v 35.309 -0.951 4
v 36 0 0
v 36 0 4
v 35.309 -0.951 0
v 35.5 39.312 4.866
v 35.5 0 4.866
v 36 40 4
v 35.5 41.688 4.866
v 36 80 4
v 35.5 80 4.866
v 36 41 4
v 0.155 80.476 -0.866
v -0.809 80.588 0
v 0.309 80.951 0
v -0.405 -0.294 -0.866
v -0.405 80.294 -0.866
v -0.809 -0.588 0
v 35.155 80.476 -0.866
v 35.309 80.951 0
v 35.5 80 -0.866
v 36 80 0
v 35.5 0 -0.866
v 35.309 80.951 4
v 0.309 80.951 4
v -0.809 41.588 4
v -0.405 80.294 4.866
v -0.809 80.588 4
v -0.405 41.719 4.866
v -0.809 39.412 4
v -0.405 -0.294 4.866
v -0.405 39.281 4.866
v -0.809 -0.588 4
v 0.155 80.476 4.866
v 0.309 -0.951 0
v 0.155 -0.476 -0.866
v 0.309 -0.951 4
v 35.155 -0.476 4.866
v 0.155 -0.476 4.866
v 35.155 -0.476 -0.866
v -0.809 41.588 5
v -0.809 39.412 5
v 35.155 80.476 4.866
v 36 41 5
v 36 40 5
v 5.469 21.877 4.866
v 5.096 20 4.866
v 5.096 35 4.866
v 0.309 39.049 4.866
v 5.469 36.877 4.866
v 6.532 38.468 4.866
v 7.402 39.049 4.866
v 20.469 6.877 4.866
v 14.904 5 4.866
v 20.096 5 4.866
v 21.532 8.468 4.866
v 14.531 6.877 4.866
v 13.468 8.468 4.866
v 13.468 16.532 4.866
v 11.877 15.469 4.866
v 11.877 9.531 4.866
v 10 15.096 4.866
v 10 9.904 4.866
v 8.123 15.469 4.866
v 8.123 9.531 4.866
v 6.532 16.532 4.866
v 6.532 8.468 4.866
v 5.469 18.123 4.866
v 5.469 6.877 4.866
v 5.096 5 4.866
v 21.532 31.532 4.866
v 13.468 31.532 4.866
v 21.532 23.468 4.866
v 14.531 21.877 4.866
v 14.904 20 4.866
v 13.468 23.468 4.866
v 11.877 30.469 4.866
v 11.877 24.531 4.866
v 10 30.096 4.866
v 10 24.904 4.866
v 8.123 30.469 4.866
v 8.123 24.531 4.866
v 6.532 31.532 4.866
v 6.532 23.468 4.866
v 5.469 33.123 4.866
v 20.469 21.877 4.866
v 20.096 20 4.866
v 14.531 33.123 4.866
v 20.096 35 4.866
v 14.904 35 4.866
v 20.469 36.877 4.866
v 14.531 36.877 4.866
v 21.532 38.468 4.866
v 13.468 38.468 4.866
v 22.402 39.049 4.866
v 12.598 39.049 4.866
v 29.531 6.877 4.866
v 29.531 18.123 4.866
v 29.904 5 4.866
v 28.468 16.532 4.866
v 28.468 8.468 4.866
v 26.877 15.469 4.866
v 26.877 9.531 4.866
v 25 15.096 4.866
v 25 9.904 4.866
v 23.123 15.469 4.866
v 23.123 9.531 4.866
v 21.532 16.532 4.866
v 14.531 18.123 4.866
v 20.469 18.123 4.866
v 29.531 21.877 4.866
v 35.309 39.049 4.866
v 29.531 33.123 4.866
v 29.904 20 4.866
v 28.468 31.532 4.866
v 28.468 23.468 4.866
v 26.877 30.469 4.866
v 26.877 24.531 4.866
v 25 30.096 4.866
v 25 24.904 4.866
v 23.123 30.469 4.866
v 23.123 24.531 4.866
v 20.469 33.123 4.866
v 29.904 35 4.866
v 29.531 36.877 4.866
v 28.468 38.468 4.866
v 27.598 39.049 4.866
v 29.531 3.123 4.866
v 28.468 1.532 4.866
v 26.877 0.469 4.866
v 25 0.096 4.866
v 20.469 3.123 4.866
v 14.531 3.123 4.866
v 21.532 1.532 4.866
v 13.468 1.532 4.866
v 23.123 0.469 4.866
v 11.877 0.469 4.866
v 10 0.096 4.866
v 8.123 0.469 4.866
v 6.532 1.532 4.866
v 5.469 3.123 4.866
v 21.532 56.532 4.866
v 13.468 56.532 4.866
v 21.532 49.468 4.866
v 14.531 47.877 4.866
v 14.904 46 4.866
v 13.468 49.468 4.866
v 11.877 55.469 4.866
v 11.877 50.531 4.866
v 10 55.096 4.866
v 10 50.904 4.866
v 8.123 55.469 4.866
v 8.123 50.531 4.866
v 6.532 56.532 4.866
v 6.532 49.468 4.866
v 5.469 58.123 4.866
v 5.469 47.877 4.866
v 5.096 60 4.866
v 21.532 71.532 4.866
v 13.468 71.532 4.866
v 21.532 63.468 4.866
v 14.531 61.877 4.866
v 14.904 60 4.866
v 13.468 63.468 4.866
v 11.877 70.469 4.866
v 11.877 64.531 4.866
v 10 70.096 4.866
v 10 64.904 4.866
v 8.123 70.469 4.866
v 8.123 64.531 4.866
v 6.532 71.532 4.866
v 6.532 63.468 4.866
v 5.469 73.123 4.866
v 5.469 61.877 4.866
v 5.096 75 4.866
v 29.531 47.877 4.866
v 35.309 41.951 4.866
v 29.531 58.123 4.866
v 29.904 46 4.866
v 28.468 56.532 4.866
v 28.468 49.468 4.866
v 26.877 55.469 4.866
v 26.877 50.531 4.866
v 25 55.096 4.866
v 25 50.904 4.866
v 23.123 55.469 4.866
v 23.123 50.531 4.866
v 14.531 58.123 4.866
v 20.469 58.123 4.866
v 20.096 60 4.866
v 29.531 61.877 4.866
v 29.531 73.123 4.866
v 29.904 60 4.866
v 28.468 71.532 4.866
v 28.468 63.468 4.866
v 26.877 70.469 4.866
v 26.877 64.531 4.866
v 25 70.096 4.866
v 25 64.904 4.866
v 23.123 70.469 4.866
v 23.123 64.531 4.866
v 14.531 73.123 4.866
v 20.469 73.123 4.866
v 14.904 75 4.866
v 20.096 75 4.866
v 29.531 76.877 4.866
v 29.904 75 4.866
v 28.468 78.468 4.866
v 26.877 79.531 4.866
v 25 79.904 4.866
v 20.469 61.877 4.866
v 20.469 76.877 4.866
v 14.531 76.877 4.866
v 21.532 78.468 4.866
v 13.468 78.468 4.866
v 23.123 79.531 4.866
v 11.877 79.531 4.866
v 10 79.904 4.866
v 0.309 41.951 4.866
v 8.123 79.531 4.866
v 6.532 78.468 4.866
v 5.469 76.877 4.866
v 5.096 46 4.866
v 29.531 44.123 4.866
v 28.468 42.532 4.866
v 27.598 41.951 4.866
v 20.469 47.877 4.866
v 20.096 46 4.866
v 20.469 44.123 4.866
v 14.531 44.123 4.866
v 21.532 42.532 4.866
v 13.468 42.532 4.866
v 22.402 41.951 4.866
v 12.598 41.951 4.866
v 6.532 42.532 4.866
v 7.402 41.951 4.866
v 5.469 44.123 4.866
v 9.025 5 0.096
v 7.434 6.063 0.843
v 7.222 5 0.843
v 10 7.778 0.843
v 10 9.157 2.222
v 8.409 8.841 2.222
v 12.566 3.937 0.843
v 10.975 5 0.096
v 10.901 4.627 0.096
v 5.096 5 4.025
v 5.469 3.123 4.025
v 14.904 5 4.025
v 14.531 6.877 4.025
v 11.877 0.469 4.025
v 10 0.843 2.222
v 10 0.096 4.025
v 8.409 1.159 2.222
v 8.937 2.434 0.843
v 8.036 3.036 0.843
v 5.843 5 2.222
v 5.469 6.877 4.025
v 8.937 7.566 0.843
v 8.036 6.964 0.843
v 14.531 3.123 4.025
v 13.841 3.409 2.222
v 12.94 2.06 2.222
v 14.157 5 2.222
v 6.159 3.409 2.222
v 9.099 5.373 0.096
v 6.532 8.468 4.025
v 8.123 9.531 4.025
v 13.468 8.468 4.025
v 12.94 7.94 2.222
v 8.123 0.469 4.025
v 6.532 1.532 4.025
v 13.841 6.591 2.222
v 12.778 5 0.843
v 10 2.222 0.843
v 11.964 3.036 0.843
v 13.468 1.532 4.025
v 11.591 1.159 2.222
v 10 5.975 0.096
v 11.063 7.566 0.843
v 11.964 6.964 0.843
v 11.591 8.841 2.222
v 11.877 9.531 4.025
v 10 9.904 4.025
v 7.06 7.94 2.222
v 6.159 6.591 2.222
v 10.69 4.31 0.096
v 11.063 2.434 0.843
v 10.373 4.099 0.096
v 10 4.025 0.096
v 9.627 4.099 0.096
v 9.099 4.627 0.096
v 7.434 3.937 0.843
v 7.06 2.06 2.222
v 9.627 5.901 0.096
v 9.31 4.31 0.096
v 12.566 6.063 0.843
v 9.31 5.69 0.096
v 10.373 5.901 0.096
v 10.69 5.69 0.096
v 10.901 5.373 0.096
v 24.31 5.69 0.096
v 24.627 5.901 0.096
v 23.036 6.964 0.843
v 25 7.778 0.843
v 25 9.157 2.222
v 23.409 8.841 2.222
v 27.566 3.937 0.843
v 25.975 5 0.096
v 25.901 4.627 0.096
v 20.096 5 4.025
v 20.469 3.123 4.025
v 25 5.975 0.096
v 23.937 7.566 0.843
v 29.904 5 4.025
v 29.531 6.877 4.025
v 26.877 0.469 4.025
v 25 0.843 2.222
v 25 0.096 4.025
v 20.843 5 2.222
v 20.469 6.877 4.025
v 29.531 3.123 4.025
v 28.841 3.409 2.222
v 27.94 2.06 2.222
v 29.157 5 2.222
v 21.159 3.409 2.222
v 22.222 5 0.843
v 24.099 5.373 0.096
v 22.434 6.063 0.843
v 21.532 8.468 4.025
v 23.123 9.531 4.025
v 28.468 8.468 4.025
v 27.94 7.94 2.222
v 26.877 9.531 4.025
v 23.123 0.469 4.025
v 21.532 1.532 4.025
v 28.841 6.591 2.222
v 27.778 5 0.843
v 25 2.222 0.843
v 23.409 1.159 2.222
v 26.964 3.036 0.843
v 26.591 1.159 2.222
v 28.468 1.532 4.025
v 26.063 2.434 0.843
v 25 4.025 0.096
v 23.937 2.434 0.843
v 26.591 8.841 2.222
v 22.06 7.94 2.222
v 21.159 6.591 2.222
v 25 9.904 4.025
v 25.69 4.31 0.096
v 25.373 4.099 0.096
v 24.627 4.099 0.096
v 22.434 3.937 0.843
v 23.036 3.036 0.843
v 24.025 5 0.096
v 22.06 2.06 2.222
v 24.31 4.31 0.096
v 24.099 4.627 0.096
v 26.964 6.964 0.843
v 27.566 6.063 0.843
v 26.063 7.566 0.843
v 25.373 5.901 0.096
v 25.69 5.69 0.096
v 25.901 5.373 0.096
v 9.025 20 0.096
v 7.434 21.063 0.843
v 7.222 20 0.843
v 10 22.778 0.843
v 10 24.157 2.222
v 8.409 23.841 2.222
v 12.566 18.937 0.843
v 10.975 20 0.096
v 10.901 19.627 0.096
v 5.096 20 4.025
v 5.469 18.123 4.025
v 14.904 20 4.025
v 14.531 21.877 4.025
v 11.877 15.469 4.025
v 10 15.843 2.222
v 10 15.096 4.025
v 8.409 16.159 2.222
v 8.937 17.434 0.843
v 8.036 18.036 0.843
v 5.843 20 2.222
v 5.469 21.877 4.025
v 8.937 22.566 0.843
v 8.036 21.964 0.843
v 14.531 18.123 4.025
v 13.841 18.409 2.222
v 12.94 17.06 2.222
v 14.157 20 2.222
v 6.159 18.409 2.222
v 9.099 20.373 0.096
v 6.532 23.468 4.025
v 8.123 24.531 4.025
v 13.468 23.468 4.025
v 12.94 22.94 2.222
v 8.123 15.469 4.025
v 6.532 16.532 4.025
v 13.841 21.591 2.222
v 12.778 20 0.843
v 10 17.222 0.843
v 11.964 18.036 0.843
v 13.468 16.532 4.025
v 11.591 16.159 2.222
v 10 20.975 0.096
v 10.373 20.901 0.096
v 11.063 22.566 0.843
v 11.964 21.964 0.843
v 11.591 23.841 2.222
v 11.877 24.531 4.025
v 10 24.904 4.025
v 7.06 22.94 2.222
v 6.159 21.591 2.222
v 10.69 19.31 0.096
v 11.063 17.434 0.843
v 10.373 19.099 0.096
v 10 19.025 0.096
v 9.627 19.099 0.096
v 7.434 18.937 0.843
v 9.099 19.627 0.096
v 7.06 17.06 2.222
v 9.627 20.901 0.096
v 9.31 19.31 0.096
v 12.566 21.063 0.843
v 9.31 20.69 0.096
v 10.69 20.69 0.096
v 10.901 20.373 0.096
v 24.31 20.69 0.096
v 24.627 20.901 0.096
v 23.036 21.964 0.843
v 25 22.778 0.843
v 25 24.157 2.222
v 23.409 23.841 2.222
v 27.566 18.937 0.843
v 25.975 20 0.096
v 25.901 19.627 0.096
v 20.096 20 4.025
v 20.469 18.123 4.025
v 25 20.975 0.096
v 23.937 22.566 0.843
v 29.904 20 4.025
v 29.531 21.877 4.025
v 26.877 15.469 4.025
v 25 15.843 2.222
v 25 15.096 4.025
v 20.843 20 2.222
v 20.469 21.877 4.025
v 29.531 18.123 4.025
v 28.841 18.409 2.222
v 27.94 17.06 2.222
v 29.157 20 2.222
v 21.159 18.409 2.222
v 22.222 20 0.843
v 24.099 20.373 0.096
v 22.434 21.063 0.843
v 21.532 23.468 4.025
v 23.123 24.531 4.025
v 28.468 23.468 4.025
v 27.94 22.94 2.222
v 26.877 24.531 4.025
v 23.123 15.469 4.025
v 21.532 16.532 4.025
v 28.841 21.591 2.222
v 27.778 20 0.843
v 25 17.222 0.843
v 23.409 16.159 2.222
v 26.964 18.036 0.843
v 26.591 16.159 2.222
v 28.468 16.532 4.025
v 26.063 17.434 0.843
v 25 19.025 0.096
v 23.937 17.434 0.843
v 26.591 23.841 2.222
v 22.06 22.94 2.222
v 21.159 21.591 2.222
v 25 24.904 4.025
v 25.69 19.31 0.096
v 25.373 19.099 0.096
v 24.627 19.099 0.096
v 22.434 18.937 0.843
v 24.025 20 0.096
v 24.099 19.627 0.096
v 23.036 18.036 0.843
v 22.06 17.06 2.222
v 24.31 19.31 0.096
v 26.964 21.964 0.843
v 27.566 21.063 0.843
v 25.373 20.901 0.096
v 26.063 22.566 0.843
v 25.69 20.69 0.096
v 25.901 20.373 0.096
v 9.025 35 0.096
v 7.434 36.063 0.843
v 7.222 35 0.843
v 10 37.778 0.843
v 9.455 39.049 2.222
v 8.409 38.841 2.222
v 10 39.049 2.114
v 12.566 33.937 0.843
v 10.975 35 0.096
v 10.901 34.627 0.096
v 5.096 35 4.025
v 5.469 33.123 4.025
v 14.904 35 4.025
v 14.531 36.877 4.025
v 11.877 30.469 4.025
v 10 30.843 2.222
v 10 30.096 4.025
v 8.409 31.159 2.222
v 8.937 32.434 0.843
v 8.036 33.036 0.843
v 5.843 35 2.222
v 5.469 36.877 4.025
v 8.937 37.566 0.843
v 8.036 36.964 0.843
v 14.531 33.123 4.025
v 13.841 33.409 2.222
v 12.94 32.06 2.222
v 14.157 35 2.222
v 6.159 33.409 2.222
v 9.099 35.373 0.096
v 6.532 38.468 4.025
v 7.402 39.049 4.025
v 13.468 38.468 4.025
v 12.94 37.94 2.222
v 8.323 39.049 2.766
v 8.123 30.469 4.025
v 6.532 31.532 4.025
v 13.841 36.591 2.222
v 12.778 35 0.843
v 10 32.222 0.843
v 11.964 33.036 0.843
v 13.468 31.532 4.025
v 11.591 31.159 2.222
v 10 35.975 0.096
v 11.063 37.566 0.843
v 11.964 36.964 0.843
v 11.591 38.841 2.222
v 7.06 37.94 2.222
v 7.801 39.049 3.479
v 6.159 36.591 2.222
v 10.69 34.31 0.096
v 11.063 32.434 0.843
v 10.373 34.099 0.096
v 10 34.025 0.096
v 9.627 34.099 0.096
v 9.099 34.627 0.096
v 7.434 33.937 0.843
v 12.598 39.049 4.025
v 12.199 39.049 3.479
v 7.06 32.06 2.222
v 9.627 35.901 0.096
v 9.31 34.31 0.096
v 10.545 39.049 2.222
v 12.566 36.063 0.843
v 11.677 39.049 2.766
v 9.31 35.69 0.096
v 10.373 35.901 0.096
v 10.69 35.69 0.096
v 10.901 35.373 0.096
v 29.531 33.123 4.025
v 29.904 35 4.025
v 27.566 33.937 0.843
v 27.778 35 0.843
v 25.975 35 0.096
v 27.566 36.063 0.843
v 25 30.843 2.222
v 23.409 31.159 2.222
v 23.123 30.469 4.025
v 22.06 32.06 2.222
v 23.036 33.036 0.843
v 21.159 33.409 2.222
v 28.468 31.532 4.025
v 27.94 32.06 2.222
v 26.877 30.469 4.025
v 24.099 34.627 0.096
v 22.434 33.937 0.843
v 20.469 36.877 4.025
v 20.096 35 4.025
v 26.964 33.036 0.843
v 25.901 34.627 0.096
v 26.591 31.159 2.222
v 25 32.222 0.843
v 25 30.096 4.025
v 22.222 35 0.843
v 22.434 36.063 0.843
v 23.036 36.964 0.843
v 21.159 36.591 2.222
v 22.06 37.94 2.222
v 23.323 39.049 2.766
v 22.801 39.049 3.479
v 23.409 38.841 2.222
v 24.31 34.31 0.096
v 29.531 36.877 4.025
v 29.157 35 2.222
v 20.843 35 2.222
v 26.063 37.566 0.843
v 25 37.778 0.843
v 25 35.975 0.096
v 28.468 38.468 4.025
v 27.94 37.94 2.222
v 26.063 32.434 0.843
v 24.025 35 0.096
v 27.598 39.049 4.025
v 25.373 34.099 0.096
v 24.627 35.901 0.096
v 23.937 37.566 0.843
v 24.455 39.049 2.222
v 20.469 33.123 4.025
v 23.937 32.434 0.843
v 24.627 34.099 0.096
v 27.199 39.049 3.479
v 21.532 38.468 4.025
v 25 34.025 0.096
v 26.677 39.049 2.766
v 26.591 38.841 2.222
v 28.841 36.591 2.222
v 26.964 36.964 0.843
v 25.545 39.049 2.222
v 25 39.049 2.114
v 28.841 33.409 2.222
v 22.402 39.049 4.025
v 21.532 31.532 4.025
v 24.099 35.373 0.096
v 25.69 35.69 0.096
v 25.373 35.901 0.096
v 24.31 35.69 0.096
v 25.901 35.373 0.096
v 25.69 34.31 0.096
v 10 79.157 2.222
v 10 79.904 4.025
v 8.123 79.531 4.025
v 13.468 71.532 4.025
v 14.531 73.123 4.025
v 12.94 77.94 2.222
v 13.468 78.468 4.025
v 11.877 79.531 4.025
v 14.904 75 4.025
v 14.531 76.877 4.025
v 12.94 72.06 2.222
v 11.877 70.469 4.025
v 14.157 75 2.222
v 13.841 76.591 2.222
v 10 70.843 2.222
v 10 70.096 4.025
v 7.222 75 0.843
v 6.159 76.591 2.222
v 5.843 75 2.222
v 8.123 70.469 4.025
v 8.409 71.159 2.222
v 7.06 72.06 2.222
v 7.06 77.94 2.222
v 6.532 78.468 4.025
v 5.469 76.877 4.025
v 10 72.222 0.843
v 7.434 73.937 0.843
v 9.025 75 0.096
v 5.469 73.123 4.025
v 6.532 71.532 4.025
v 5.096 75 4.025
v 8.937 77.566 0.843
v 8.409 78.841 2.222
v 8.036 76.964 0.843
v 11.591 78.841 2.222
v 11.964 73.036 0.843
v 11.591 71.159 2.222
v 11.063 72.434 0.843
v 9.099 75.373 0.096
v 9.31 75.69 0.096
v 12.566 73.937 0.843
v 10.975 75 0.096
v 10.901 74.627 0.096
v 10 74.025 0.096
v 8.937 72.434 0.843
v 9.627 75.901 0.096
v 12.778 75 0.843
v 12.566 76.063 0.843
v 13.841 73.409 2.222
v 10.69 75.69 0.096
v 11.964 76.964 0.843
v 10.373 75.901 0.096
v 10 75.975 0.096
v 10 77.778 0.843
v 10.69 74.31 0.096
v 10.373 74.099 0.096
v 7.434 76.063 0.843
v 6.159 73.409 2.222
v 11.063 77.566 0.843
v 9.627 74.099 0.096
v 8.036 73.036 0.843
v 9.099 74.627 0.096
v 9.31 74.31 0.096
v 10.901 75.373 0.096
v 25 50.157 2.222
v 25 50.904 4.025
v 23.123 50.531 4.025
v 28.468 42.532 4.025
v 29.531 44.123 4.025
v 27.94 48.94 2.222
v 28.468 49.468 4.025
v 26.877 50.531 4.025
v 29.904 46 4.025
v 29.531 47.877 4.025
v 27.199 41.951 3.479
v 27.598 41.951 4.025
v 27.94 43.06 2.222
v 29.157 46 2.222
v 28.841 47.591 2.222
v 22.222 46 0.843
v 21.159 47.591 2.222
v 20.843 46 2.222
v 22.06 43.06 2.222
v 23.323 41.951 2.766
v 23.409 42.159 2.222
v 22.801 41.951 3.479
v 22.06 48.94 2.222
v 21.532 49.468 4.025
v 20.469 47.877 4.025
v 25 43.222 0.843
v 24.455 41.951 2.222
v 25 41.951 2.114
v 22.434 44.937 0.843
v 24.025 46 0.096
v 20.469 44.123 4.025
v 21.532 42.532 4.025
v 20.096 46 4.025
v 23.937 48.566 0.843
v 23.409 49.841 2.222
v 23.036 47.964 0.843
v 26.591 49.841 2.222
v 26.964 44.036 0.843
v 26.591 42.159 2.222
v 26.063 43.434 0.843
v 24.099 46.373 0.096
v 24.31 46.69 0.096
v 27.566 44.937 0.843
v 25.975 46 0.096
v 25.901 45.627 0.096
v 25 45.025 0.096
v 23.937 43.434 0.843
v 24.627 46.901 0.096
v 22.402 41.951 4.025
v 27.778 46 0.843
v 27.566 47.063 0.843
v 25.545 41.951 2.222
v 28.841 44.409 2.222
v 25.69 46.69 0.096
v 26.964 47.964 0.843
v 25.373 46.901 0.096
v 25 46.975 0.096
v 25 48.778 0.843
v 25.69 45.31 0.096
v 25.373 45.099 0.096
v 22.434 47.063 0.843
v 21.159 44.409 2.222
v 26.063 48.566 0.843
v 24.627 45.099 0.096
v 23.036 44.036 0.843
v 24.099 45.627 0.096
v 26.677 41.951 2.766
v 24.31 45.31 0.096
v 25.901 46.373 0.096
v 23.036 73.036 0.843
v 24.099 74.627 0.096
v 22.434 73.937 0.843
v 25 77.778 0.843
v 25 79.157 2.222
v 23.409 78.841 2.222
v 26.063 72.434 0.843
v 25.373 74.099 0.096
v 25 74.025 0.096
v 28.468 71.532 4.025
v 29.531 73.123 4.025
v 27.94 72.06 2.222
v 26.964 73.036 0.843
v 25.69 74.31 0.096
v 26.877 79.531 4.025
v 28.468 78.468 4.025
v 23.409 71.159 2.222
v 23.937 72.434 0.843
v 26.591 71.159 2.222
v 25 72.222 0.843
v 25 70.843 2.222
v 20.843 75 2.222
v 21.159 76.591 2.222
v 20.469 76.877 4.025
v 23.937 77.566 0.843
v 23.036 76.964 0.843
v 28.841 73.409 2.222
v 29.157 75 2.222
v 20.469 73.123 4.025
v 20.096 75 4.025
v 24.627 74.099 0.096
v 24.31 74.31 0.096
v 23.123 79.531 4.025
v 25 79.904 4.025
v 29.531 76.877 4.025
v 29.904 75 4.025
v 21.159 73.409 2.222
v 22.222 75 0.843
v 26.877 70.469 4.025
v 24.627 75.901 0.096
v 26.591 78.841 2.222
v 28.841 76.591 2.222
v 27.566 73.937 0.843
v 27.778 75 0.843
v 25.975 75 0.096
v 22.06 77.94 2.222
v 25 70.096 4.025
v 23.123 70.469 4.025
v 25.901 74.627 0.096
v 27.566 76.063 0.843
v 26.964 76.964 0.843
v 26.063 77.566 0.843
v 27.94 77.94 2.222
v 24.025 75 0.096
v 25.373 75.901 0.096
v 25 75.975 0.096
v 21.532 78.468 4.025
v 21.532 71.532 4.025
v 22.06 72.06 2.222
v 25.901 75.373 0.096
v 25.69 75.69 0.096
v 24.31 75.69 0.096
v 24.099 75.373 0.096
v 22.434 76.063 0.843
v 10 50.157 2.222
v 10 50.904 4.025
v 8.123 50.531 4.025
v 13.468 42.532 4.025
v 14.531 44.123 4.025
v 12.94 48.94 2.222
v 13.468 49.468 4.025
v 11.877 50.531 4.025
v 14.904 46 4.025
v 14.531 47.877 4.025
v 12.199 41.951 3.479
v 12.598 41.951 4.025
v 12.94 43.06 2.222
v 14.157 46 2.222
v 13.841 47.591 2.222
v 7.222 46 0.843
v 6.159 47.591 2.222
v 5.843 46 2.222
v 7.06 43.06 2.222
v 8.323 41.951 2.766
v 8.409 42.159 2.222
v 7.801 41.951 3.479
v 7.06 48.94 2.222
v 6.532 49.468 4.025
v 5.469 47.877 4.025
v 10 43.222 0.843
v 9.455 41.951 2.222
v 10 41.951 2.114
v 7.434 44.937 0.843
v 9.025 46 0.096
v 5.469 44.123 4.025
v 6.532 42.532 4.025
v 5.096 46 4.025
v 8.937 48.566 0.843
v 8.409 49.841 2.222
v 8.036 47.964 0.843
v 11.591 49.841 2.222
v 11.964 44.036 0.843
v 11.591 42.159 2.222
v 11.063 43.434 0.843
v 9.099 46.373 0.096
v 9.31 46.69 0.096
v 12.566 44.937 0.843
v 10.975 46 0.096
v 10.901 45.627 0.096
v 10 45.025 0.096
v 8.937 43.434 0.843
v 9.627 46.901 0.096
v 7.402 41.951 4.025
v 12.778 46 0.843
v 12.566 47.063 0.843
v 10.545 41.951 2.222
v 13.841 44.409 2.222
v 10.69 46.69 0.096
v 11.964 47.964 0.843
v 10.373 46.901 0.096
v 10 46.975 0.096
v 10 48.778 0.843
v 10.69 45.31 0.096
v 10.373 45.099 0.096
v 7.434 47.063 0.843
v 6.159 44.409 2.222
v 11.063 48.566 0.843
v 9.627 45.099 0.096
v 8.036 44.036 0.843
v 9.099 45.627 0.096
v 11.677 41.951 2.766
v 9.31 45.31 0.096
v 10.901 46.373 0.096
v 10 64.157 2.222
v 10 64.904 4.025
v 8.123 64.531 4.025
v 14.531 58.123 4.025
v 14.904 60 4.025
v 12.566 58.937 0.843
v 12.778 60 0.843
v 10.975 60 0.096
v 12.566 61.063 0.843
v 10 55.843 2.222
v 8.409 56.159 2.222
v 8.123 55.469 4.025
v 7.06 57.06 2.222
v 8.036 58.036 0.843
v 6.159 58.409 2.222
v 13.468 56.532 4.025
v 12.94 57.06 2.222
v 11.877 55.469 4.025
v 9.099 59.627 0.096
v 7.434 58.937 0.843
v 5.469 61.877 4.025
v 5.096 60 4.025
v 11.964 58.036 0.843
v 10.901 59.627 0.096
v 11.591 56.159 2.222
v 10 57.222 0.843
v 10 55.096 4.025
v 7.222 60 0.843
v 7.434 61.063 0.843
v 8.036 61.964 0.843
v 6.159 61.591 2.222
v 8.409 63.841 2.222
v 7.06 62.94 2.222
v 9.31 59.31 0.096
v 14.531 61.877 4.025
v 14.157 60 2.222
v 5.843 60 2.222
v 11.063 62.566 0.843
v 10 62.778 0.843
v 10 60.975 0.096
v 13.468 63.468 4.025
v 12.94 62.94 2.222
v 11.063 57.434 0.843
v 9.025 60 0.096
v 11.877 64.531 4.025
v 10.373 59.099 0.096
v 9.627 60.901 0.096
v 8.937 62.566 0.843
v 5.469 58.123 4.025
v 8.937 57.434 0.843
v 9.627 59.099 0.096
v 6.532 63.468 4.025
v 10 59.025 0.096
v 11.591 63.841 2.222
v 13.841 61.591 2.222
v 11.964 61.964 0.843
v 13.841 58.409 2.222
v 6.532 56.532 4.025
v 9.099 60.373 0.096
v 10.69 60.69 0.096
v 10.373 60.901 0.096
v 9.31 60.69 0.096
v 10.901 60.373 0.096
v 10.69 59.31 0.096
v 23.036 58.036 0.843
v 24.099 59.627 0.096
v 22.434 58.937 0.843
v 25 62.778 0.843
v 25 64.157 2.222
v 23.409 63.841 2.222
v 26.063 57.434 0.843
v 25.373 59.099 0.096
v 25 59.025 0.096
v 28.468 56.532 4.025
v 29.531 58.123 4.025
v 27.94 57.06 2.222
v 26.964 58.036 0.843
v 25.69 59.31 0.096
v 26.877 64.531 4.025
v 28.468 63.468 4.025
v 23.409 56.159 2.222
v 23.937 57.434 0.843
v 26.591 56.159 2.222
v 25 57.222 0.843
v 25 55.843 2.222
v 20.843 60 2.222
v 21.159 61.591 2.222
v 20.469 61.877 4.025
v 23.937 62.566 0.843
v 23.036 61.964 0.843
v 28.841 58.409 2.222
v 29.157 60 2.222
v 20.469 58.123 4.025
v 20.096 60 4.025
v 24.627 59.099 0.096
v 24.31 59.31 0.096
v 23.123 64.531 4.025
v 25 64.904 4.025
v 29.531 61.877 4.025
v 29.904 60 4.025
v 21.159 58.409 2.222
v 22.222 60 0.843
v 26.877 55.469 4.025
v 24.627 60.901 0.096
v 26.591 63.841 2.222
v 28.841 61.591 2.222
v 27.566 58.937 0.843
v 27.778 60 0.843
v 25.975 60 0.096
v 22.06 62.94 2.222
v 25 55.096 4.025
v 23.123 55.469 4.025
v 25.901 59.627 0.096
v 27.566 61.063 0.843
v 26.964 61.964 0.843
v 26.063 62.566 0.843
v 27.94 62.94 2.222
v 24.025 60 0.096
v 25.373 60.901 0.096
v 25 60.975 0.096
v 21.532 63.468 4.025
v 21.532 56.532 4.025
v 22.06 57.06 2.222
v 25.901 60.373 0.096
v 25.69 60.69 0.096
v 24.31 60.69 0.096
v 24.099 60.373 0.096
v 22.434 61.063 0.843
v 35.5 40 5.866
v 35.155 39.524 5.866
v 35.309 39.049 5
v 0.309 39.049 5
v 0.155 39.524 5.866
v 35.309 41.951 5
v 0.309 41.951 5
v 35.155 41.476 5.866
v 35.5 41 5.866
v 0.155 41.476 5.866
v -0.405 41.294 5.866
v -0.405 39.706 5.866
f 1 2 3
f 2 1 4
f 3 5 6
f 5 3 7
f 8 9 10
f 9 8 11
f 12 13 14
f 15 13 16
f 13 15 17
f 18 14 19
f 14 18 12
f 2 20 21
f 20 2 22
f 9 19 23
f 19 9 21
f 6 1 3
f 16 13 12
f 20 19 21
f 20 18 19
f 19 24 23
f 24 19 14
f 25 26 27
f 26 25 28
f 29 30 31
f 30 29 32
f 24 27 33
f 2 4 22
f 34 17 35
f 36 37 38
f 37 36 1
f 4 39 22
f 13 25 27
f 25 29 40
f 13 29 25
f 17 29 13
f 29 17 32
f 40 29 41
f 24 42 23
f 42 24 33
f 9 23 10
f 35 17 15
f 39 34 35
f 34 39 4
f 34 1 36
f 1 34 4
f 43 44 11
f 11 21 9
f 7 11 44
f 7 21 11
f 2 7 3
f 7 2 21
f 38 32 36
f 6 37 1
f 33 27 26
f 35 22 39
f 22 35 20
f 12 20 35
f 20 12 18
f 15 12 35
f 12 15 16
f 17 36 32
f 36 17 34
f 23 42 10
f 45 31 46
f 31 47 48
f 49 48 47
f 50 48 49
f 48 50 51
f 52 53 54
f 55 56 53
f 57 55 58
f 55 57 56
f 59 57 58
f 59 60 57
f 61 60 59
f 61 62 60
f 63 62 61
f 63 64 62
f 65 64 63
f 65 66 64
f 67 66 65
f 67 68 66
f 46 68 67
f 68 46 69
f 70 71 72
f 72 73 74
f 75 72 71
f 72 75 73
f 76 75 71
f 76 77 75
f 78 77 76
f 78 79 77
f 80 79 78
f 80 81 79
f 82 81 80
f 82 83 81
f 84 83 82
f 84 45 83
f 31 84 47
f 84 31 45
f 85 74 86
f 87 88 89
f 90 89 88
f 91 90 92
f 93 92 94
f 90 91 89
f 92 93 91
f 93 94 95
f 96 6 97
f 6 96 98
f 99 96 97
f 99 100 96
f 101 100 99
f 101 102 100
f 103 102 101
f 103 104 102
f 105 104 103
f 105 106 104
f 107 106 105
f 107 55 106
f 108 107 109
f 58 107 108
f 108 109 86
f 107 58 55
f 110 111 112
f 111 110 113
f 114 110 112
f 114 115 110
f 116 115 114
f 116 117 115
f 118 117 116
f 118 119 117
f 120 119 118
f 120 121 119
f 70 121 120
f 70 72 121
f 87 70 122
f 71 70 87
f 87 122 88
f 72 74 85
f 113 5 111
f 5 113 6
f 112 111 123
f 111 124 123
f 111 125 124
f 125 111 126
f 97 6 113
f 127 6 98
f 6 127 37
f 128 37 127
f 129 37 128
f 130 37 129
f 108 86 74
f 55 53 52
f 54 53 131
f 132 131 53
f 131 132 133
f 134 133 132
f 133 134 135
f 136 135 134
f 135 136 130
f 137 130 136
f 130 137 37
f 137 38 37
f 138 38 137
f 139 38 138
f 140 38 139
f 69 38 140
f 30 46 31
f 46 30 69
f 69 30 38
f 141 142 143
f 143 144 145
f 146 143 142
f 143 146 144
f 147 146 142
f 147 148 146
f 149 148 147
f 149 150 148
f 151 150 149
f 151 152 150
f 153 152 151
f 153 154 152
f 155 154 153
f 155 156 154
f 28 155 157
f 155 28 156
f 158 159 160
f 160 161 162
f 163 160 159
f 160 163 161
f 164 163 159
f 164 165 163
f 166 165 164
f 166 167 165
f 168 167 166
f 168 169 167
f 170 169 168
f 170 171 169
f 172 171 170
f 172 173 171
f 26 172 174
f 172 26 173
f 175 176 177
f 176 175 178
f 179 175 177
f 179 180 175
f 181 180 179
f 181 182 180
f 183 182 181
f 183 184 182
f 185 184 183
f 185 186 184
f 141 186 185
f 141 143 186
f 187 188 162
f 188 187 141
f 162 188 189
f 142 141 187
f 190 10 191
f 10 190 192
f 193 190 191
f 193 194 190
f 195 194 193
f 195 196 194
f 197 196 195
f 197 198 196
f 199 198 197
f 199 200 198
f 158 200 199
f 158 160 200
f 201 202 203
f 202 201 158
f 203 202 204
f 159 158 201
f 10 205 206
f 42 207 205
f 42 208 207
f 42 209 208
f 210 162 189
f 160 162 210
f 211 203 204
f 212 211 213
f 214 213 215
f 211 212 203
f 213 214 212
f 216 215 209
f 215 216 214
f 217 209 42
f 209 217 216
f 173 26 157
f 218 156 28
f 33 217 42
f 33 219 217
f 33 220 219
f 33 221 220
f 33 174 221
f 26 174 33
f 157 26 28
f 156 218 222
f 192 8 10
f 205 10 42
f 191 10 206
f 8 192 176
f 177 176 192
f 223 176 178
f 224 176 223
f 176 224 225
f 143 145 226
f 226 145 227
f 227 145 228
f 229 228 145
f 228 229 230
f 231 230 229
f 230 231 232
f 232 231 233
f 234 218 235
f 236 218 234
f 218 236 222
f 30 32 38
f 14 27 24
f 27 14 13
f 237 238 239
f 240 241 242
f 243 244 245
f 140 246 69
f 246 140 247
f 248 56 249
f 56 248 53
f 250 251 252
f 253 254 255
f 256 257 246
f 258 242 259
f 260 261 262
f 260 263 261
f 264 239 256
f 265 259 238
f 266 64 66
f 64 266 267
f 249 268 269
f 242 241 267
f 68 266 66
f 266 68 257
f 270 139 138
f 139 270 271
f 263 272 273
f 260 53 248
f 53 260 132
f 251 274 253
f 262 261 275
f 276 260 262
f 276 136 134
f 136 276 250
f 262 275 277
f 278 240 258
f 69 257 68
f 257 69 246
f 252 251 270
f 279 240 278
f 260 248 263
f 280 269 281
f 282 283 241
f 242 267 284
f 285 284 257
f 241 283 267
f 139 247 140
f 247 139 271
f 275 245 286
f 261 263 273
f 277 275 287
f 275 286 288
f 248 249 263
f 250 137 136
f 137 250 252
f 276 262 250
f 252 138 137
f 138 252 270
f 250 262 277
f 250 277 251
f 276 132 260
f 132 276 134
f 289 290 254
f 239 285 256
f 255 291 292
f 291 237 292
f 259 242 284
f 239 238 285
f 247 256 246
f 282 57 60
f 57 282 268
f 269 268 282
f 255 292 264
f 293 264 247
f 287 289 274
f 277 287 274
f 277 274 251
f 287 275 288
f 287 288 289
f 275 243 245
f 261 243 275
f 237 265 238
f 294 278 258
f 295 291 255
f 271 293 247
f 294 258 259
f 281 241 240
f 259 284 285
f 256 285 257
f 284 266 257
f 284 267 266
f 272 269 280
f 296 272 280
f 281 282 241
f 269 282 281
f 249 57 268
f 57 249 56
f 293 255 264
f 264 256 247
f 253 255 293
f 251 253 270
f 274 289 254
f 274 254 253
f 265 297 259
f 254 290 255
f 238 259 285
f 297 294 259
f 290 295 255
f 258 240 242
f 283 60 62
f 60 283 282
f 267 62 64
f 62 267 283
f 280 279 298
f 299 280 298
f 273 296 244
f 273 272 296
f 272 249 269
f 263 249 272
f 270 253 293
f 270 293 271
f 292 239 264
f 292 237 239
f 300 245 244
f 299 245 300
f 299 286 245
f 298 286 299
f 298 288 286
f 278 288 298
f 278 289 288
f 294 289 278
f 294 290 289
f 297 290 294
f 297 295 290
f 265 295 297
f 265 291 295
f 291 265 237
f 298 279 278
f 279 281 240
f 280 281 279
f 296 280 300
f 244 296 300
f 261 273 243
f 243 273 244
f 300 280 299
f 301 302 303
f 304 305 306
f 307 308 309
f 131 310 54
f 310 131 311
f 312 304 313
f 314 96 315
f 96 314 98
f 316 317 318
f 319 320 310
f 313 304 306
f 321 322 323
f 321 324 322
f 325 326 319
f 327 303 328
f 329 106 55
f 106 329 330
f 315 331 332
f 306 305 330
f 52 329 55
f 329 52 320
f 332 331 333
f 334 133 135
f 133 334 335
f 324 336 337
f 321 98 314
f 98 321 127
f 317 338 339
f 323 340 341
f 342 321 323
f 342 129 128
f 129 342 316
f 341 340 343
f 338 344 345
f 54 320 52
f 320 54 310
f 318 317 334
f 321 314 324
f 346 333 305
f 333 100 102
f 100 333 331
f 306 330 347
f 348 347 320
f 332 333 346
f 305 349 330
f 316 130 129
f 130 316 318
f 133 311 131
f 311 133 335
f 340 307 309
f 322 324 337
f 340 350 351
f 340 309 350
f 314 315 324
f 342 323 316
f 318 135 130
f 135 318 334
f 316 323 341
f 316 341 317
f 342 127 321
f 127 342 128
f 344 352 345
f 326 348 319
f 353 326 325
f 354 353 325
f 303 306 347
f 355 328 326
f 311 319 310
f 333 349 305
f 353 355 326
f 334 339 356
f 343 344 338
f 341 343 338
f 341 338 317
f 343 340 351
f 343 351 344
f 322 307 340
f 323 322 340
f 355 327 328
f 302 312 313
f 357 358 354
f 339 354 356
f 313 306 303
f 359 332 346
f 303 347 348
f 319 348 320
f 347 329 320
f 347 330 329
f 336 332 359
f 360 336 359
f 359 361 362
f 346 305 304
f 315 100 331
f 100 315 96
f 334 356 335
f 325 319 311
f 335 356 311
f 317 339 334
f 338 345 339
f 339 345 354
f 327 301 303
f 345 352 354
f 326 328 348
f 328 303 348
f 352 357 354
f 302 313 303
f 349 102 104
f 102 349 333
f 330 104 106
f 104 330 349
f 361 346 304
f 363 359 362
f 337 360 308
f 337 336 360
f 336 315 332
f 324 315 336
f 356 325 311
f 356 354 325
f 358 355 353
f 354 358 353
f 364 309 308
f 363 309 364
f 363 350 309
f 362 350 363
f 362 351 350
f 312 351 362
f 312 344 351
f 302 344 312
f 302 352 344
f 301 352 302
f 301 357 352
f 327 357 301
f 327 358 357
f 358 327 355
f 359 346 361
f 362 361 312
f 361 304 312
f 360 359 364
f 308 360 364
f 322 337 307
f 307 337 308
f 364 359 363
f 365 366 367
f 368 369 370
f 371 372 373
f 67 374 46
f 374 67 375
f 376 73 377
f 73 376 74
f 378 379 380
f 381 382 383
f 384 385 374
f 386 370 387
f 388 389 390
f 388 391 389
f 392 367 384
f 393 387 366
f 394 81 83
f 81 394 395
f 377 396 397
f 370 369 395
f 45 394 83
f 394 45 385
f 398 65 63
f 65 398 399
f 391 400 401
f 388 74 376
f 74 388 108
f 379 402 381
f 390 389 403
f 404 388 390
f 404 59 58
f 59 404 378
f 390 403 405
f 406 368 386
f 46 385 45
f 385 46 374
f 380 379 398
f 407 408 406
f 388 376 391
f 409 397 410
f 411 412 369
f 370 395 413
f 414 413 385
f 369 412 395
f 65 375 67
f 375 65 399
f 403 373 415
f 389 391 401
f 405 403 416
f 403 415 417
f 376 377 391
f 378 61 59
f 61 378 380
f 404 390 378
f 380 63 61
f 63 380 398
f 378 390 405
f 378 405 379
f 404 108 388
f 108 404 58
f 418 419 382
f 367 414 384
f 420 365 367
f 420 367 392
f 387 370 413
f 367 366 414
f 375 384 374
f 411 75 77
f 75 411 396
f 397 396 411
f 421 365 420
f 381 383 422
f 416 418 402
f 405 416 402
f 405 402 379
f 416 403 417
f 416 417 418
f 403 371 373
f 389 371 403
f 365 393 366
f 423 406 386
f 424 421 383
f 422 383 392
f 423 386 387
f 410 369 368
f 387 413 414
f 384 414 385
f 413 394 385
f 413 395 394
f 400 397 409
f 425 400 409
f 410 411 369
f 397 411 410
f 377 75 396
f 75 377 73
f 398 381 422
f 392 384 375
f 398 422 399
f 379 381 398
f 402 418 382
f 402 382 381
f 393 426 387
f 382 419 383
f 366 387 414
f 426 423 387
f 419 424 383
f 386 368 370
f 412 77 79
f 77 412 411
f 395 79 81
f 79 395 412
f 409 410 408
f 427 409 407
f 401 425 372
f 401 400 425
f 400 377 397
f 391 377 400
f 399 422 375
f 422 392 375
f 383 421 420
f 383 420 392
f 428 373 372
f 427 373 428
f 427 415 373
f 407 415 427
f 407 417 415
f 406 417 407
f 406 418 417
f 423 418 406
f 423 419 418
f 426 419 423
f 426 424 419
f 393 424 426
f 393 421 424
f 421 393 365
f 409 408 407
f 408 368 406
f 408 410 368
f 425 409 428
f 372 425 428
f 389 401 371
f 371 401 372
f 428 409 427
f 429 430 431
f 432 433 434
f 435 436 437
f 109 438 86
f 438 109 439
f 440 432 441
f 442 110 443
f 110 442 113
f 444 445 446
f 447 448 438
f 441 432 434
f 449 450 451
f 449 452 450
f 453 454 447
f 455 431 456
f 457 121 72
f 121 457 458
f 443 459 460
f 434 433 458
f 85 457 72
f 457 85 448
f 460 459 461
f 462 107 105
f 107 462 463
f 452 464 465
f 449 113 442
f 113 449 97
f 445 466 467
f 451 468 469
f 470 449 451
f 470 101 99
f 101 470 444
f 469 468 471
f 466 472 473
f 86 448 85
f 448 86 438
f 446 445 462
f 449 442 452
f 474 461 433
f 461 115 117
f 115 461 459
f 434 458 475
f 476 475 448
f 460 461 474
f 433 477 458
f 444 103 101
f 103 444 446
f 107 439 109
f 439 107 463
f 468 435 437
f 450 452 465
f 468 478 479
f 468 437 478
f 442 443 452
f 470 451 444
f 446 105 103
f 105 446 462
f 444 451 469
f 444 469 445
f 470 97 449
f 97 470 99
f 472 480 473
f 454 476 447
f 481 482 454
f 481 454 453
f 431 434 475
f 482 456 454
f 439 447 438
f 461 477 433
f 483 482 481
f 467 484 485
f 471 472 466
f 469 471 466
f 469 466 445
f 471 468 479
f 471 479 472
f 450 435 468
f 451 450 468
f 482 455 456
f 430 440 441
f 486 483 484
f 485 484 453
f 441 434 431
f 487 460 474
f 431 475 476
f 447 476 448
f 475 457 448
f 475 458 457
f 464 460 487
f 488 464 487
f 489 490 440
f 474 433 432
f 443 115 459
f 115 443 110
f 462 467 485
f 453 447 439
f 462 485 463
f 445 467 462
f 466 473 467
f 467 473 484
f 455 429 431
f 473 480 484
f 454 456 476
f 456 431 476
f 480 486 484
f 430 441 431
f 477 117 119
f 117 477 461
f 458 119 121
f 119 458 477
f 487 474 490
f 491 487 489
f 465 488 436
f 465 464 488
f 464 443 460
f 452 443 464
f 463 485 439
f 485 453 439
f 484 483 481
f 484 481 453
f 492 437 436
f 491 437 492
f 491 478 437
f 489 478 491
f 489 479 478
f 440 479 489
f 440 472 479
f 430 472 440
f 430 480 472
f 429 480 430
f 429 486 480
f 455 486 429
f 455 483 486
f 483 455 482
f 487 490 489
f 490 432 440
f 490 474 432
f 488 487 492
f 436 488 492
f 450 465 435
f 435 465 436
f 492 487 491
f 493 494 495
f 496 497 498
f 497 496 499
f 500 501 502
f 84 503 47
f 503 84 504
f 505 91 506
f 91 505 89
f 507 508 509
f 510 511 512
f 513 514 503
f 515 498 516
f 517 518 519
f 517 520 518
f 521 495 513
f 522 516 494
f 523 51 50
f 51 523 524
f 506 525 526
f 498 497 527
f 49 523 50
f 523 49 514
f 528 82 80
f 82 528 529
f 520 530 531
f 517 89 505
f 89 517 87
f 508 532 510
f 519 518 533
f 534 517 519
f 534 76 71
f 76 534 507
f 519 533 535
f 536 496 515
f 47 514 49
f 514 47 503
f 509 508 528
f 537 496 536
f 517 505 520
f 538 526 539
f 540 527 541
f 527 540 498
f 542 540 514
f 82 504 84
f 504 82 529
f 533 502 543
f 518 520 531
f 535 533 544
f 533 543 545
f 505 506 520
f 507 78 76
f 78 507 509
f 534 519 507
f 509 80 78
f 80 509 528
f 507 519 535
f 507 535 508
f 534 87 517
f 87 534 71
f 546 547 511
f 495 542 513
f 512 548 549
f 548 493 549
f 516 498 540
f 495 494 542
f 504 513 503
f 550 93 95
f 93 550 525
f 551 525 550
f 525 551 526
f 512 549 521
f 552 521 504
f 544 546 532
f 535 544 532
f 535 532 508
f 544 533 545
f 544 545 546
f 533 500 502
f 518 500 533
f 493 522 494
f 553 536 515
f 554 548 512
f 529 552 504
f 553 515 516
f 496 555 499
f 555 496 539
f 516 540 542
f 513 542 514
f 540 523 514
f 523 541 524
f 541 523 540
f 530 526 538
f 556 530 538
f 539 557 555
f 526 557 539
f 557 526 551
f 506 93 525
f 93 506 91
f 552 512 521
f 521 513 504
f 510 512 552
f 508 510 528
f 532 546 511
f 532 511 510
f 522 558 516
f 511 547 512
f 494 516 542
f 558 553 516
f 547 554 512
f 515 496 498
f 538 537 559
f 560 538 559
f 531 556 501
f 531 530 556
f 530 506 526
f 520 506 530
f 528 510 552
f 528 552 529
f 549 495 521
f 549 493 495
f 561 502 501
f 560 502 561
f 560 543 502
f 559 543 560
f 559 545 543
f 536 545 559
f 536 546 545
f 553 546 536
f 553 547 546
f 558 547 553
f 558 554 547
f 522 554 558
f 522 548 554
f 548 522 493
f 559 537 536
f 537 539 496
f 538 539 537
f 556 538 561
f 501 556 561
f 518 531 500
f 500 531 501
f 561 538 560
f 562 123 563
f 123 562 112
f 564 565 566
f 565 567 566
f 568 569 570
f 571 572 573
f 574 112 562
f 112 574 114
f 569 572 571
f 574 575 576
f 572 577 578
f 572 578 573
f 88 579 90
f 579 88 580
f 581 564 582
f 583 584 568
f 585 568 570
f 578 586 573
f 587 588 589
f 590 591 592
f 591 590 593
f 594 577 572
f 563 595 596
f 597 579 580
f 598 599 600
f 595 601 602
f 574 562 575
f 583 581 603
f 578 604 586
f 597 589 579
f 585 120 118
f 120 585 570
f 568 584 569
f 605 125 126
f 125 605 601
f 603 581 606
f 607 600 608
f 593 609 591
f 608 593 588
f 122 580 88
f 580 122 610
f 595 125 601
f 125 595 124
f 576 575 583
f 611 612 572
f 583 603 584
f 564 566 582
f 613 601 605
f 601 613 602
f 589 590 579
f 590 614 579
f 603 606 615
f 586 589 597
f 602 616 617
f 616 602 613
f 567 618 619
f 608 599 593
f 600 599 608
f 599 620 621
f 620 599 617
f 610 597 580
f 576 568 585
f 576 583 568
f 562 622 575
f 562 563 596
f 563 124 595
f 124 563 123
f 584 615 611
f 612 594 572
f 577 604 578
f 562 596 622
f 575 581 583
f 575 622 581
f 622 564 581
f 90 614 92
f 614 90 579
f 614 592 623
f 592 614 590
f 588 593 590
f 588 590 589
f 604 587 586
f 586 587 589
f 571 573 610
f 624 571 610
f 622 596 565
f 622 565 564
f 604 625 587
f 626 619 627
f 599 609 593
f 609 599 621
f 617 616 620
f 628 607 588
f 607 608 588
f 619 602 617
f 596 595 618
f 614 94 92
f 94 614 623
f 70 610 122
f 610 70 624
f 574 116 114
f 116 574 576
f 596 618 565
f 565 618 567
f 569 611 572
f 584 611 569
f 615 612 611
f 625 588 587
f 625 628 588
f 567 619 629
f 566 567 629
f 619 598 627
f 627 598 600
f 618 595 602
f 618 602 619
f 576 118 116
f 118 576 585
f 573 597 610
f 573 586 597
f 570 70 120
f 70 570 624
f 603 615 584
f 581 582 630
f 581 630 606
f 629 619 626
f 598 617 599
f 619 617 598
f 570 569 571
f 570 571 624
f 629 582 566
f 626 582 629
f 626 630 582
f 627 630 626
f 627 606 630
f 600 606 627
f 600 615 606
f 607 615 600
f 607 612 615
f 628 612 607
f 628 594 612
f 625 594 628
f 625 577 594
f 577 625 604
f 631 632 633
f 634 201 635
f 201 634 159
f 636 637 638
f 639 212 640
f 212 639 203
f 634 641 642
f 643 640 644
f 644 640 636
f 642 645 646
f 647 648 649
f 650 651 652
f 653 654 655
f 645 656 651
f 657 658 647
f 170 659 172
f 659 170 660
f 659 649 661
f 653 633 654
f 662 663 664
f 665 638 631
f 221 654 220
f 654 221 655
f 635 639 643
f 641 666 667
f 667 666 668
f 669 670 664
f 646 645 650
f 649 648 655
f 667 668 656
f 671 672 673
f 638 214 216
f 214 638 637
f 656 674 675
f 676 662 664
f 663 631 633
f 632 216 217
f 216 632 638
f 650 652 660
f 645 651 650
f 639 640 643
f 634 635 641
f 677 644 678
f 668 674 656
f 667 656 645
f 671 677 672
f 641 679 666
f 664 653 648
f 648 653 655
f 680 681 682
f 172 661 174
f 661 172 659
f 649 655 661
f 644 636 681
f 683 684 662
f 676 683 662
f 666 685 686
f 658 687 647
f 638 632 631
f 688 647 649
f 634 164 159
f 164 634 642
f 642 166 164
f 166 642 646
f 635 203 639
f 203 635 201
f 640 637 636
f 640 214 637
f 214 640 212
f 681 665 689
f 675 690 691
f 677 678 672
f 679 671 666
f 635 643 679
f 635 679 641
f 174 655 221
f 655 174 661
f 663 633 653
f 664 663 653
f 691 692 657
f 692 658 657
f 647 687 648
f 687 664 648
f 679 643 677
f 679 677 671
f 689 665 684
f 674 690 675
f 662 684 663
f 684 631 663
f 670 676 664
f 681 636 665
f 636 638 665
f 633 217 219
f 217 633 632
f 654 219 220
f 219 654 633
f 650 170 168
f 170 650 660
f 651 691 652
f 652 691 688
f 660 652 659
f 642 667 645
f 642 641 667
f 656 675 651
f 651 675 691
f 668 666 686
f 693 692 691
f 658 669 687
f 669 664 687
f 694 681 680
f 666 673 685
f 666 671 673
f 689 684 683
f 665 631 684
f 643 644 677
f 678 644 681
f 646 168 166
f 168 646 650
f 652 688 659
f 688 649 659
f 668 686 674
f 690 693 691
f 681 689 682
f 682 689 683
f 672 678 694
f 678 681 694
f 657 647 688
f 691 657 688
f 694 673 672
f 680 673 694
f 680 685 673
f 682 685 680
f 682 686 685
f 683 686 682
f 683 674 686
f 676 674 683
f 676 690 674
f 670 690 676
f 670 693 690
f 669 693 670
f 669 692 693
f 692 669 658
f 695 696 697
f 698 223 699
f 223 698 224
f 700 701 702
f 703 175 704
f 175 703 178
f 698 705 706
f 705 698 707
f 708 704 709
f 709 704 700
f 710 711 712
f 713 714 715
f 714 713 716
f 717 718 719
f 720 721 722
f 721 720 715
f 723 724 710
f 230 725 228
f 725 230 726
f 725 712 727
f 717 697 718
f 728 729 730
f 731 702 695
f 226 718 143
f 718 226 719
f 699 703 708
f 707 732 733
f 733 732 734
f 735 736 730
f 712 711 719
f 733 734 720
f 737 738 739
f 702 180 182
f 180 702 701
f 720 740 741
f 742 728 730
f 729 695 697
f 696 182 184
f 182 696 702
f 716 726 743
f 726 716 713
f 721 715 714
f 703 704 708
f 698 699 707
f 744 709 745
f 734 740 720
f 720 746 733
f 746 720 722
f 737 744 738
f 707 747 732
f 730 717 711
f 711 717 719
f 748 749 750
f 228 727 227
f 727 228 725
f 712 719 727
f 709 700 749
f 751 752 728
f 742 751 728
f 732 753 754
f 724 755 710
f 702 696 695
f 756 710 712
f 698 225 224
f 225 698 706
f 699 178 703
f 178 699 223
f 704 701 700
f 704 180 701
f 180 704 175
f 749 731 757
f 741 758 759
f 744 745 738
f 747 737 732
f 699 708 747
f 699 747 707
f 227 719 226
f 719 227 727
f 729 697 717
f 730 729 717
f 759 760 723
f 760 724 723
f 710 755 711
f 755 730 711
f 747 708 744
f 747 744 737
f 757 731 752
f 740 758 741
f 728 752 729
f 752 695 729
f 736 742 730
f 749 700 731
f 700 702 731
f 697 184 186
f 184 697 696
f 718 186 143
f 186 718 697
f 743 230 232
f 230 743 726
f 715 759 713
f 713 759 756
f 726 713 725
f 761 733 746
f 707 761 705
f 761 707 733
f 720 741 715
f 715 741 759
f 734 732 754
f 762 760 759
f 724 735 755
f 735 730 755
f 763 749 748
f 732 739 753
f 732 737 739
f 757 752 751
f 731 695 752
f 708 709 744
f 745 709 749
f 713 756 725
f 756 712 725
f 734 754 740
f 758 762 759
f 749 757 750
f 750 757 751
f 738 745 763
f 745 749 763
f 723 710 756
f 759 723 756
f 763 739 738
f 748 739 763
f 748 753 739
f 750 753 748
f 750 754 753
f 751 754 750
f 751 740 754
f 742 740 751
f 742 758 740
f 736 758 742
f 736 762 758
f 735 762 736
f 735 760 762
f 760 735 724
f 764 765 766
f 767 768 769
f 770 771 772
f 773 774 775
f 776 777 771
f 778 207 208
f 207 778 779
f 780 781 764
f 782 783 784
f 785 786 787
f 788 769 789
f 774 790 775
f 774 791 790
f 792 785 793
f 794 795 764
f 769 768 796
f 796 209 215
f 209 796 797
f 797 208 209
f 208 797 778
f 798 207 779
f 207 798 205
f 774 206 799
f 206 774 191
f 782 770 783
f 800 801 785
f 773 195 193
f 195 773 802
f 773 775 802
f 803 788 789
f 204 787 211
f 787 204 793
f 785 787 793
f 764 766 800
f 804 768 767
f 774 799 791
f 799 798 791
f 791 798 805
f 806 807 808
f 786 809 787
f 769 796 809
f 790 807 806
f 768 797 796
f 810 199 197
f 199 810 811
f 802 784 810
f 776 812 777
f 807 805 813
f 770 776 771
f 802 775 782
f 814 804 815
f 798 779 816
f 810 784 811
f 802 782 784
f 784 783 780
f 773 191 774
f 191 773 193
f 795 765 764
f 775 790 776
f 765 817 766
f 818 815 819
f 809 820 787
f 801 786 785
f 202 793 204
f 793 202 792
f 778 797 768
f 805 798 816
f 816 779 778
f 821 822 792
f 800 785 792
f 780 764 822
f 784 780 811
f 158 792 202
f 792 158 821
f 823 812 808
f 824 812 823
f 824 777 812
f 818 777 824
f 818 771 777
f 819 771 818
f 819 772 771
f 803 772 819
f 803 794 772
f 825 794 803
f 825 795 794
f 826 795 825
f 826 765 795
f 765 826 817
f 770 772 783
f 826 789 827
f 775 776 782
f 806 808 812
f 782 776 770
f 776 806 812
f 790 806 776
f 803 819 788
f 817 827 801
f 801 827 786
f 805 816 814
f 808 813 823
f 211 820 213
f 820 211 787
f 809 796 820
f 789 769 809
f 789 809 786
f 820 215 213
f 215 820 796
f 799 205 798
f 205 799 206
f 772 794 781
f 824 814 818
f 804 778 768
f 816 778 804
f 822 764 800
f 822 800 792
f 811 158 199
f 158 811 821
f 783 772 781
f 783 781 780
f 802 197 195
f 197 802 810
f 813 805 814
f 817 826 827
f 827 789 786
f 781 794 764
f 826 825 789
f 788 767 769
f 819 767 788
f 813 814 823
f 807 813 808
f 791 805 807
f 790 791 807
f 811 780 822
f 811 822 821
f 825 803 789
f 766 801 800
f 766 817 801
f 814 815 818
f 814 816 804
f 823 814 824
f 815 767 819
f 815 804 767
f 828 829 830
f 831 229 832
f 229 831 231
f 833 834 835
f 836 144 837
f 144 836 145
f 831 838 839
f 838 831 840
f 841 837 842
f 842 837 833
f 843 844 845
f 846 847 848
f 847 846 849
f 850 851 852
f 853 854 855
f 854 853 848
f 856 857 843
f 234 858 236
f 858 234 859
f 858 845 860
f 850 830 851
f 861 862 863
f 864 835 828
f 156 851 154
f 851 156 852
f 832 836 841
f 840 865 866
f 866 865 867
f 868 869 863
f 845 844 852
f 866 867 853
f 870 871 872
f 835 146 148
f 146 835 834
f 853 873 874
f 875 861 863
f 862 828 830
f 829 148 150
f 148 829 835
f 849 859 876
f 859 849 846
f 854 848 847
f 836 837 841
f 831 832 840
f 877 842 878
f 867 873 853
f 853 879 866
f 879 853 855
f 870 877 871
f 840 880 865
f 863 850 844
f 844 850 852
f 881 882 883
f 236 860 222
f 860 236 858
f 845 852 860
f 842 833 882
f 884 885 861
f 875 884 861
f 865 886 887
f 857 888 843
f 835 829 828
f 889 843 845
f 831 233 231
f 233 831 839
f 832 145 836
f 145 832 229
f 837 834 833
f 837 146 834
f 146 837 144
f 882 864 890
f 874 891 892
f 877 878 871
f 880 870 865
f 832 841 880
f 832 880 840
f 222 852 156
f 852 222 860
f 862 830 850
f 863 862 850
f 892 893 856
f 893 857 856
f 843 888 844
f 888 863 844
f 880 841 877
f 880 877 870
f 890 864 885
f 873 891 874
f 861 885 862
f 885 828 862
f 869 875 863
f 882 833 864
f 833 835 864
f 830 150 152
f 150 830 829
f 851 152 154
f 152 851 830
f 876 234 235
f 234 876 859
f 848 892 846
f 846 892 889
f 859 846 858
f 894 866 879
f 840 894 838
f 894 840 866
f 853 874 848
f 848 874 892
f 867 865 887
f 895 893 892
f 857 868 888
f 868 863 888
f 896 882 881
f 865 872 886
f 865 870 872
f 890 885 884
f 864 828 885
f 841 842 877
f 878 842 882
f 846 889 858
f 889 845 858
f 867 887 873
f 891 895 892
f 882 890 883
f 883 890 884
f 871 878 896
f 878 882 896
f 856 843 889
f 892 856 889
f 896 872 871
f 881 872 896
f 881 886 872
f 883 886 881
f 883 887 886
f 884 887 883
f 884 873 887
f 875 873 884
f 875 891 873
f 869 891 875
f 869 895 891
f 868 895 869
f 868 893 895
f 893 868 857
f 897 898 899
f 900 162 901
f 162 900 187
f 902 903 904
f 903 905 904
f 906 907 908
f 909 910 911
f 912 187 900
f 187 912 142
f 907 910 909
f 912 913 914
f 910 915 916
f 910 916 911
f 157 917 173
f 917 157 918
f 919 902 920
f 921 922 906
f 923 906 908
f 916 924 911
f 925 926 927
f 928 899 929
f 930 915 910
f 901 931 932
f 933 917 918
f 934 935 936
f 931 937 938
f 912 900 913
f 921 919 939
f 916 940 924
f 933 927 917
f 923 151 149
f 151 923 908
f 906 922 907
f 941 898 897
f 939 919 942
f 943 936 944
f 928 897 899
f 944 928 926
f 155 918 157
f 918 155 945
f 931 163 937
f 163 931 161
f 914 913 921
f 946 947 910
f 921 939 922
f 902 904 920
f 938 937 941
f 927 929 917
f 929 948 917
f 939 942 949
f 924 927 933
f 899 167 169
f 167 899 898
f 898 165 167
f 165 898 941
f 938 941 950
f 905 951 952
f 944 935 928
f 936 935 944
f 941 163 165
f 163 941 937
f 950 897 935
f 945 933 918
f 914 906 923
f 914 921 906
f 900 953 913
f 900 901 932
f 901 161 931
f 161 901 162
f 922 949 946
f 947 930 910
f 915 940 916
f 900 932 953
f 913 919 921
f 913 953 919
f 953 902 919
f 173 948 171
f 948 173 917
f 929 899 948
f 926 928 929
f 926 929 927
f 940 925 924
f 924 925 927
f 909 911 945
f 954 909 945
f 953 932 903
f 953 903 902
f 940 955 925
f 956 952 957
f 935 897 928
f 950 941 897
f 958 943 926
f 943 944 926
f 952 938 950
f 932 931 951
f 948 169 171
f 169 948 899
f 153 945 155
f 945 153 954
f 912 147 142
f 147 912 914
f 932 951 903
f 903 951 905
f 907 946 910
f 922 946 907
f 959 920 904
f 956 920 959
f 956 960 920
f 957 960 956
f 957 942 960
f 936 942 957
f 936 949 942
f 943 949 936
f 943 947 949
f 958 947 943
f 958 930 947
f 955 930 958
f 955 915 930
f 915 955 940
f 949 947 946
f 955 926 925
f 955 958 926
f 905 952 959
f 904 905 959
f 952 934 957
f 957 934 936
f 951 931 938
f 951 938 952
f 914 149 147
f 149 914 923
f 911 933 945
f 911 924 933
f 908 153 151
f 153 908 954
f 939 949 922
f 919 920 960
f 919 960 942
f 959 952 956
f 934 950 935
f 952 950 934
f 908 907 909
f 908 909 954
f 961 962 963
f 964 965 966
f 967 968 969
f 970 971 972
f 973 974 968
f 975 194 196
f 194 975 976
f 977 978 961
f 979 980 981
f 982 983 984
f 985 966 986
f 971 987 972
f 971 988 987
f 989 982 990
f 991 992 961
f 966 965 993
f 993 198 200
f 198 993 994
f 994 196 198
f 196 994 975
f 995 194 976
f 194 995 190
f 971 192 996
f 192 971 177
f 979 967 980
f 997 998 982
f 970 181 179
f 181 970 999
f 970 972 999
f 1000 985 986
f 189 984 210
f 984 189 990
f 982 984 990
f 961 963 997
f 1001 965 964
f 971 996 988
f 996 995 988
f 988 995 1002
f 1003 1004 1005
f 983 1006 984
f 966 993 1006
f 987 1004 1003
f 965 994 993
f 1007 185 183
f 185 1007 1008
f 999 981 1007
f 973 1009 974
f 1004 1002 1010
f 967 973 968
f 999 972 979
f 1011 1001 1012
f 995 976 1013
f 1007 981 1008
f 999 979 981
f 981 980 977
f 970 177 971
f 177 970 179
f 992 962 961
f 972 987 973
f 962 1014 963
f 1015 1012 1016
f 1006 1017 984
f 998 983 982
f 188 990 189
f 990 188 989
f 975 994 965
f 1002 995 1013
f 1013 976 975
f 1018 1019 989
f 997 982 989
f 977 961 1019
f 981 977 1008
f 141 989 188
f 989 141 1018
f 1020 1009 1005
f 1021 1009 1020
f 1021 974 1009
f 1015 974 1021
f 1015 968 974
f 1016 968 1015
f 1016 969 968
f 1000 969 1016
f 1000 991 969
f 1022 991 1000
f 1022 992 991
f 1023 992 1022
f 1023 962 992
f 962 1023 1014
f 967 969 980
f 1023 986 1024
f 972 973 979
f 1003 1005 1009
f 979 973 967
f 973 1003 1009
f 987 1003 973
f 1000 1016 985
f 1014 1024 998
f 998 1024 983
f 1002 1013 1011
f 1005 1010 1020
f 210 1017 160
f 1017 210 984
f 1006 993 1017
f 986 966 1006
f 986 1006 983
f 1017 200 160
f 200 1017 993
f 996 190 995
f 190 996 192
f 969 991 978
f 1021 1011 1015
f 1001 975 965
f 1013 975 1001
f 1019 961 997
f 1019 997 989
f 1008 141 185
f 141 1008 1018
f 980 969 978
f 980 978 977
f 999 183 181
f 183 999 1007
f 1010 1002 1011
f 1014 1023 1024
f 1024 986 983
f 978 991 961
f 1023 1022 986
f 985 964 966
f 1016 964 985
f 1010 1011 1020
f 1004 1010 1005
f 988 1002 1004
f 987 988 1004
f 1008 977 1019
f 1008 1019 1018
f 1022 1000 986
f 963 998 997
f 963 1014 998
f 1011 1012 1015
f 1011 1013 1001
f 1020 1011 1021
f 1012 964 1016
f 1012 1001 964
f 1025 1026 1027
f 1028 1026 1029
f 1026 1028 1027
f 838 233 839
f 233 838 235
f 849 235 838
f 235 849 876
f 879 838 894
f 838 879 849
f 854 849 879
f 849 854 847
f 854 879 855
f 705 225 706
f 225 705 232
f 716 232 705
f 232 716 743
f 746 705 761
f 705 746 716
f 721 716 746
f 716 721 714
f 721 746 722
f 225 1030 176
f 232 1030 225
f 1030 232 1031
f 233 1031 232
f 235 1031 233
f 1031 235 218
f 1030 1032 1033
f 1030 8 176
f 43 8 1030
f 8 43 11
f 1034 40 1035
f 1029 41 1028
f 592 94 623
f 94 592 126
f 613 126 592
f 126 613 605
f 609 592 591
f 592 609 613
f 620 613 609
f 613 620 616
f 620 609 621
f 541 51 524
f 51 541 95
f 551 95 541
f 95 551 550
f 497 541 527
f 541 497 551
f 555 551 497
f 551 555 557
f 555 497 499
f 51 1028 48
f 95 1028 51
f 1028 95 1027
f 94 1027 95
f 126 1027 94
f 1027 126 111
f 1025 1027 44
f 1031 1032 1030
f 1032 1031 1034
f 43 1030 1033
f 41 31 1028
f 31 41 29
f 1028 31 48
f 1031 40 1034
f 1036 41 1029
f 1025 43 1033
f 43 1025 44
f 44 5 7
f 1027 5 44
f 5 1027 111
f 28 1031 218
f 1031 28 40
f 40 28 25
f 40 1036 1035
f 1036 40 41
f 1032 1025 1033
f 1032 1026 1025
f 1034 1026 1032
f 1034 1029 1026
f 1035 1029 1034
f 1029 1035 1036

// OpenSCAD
// Loguncov Maxim 13.12.13


//$fn=128;


translate([0,40,0])
minkowski()
{cube([35,1,5]);
sphere(1);
}

difference() {

//основа
minkowski()
{cube([35,80,4]);
sphere(1);
}

//отверстия
translate([10,5,5])sphere(5);
translate([25,5,5])sphere(5);
translate([10,20,5])sphere(5);
translate([25,20,5])sphere(5);
translate([10,35,5])sphere(5);
translate([25,35,5])sphere(5);

translate([10,75,5])sphere(5);
translate([25,46,5])sphere(5);
translate([25,75,5])sphere(5);
translate([10,46,5])sphere(5);
translate([10,60,5])sphere(5);
translate([25,60,5])sphere(5);
}
